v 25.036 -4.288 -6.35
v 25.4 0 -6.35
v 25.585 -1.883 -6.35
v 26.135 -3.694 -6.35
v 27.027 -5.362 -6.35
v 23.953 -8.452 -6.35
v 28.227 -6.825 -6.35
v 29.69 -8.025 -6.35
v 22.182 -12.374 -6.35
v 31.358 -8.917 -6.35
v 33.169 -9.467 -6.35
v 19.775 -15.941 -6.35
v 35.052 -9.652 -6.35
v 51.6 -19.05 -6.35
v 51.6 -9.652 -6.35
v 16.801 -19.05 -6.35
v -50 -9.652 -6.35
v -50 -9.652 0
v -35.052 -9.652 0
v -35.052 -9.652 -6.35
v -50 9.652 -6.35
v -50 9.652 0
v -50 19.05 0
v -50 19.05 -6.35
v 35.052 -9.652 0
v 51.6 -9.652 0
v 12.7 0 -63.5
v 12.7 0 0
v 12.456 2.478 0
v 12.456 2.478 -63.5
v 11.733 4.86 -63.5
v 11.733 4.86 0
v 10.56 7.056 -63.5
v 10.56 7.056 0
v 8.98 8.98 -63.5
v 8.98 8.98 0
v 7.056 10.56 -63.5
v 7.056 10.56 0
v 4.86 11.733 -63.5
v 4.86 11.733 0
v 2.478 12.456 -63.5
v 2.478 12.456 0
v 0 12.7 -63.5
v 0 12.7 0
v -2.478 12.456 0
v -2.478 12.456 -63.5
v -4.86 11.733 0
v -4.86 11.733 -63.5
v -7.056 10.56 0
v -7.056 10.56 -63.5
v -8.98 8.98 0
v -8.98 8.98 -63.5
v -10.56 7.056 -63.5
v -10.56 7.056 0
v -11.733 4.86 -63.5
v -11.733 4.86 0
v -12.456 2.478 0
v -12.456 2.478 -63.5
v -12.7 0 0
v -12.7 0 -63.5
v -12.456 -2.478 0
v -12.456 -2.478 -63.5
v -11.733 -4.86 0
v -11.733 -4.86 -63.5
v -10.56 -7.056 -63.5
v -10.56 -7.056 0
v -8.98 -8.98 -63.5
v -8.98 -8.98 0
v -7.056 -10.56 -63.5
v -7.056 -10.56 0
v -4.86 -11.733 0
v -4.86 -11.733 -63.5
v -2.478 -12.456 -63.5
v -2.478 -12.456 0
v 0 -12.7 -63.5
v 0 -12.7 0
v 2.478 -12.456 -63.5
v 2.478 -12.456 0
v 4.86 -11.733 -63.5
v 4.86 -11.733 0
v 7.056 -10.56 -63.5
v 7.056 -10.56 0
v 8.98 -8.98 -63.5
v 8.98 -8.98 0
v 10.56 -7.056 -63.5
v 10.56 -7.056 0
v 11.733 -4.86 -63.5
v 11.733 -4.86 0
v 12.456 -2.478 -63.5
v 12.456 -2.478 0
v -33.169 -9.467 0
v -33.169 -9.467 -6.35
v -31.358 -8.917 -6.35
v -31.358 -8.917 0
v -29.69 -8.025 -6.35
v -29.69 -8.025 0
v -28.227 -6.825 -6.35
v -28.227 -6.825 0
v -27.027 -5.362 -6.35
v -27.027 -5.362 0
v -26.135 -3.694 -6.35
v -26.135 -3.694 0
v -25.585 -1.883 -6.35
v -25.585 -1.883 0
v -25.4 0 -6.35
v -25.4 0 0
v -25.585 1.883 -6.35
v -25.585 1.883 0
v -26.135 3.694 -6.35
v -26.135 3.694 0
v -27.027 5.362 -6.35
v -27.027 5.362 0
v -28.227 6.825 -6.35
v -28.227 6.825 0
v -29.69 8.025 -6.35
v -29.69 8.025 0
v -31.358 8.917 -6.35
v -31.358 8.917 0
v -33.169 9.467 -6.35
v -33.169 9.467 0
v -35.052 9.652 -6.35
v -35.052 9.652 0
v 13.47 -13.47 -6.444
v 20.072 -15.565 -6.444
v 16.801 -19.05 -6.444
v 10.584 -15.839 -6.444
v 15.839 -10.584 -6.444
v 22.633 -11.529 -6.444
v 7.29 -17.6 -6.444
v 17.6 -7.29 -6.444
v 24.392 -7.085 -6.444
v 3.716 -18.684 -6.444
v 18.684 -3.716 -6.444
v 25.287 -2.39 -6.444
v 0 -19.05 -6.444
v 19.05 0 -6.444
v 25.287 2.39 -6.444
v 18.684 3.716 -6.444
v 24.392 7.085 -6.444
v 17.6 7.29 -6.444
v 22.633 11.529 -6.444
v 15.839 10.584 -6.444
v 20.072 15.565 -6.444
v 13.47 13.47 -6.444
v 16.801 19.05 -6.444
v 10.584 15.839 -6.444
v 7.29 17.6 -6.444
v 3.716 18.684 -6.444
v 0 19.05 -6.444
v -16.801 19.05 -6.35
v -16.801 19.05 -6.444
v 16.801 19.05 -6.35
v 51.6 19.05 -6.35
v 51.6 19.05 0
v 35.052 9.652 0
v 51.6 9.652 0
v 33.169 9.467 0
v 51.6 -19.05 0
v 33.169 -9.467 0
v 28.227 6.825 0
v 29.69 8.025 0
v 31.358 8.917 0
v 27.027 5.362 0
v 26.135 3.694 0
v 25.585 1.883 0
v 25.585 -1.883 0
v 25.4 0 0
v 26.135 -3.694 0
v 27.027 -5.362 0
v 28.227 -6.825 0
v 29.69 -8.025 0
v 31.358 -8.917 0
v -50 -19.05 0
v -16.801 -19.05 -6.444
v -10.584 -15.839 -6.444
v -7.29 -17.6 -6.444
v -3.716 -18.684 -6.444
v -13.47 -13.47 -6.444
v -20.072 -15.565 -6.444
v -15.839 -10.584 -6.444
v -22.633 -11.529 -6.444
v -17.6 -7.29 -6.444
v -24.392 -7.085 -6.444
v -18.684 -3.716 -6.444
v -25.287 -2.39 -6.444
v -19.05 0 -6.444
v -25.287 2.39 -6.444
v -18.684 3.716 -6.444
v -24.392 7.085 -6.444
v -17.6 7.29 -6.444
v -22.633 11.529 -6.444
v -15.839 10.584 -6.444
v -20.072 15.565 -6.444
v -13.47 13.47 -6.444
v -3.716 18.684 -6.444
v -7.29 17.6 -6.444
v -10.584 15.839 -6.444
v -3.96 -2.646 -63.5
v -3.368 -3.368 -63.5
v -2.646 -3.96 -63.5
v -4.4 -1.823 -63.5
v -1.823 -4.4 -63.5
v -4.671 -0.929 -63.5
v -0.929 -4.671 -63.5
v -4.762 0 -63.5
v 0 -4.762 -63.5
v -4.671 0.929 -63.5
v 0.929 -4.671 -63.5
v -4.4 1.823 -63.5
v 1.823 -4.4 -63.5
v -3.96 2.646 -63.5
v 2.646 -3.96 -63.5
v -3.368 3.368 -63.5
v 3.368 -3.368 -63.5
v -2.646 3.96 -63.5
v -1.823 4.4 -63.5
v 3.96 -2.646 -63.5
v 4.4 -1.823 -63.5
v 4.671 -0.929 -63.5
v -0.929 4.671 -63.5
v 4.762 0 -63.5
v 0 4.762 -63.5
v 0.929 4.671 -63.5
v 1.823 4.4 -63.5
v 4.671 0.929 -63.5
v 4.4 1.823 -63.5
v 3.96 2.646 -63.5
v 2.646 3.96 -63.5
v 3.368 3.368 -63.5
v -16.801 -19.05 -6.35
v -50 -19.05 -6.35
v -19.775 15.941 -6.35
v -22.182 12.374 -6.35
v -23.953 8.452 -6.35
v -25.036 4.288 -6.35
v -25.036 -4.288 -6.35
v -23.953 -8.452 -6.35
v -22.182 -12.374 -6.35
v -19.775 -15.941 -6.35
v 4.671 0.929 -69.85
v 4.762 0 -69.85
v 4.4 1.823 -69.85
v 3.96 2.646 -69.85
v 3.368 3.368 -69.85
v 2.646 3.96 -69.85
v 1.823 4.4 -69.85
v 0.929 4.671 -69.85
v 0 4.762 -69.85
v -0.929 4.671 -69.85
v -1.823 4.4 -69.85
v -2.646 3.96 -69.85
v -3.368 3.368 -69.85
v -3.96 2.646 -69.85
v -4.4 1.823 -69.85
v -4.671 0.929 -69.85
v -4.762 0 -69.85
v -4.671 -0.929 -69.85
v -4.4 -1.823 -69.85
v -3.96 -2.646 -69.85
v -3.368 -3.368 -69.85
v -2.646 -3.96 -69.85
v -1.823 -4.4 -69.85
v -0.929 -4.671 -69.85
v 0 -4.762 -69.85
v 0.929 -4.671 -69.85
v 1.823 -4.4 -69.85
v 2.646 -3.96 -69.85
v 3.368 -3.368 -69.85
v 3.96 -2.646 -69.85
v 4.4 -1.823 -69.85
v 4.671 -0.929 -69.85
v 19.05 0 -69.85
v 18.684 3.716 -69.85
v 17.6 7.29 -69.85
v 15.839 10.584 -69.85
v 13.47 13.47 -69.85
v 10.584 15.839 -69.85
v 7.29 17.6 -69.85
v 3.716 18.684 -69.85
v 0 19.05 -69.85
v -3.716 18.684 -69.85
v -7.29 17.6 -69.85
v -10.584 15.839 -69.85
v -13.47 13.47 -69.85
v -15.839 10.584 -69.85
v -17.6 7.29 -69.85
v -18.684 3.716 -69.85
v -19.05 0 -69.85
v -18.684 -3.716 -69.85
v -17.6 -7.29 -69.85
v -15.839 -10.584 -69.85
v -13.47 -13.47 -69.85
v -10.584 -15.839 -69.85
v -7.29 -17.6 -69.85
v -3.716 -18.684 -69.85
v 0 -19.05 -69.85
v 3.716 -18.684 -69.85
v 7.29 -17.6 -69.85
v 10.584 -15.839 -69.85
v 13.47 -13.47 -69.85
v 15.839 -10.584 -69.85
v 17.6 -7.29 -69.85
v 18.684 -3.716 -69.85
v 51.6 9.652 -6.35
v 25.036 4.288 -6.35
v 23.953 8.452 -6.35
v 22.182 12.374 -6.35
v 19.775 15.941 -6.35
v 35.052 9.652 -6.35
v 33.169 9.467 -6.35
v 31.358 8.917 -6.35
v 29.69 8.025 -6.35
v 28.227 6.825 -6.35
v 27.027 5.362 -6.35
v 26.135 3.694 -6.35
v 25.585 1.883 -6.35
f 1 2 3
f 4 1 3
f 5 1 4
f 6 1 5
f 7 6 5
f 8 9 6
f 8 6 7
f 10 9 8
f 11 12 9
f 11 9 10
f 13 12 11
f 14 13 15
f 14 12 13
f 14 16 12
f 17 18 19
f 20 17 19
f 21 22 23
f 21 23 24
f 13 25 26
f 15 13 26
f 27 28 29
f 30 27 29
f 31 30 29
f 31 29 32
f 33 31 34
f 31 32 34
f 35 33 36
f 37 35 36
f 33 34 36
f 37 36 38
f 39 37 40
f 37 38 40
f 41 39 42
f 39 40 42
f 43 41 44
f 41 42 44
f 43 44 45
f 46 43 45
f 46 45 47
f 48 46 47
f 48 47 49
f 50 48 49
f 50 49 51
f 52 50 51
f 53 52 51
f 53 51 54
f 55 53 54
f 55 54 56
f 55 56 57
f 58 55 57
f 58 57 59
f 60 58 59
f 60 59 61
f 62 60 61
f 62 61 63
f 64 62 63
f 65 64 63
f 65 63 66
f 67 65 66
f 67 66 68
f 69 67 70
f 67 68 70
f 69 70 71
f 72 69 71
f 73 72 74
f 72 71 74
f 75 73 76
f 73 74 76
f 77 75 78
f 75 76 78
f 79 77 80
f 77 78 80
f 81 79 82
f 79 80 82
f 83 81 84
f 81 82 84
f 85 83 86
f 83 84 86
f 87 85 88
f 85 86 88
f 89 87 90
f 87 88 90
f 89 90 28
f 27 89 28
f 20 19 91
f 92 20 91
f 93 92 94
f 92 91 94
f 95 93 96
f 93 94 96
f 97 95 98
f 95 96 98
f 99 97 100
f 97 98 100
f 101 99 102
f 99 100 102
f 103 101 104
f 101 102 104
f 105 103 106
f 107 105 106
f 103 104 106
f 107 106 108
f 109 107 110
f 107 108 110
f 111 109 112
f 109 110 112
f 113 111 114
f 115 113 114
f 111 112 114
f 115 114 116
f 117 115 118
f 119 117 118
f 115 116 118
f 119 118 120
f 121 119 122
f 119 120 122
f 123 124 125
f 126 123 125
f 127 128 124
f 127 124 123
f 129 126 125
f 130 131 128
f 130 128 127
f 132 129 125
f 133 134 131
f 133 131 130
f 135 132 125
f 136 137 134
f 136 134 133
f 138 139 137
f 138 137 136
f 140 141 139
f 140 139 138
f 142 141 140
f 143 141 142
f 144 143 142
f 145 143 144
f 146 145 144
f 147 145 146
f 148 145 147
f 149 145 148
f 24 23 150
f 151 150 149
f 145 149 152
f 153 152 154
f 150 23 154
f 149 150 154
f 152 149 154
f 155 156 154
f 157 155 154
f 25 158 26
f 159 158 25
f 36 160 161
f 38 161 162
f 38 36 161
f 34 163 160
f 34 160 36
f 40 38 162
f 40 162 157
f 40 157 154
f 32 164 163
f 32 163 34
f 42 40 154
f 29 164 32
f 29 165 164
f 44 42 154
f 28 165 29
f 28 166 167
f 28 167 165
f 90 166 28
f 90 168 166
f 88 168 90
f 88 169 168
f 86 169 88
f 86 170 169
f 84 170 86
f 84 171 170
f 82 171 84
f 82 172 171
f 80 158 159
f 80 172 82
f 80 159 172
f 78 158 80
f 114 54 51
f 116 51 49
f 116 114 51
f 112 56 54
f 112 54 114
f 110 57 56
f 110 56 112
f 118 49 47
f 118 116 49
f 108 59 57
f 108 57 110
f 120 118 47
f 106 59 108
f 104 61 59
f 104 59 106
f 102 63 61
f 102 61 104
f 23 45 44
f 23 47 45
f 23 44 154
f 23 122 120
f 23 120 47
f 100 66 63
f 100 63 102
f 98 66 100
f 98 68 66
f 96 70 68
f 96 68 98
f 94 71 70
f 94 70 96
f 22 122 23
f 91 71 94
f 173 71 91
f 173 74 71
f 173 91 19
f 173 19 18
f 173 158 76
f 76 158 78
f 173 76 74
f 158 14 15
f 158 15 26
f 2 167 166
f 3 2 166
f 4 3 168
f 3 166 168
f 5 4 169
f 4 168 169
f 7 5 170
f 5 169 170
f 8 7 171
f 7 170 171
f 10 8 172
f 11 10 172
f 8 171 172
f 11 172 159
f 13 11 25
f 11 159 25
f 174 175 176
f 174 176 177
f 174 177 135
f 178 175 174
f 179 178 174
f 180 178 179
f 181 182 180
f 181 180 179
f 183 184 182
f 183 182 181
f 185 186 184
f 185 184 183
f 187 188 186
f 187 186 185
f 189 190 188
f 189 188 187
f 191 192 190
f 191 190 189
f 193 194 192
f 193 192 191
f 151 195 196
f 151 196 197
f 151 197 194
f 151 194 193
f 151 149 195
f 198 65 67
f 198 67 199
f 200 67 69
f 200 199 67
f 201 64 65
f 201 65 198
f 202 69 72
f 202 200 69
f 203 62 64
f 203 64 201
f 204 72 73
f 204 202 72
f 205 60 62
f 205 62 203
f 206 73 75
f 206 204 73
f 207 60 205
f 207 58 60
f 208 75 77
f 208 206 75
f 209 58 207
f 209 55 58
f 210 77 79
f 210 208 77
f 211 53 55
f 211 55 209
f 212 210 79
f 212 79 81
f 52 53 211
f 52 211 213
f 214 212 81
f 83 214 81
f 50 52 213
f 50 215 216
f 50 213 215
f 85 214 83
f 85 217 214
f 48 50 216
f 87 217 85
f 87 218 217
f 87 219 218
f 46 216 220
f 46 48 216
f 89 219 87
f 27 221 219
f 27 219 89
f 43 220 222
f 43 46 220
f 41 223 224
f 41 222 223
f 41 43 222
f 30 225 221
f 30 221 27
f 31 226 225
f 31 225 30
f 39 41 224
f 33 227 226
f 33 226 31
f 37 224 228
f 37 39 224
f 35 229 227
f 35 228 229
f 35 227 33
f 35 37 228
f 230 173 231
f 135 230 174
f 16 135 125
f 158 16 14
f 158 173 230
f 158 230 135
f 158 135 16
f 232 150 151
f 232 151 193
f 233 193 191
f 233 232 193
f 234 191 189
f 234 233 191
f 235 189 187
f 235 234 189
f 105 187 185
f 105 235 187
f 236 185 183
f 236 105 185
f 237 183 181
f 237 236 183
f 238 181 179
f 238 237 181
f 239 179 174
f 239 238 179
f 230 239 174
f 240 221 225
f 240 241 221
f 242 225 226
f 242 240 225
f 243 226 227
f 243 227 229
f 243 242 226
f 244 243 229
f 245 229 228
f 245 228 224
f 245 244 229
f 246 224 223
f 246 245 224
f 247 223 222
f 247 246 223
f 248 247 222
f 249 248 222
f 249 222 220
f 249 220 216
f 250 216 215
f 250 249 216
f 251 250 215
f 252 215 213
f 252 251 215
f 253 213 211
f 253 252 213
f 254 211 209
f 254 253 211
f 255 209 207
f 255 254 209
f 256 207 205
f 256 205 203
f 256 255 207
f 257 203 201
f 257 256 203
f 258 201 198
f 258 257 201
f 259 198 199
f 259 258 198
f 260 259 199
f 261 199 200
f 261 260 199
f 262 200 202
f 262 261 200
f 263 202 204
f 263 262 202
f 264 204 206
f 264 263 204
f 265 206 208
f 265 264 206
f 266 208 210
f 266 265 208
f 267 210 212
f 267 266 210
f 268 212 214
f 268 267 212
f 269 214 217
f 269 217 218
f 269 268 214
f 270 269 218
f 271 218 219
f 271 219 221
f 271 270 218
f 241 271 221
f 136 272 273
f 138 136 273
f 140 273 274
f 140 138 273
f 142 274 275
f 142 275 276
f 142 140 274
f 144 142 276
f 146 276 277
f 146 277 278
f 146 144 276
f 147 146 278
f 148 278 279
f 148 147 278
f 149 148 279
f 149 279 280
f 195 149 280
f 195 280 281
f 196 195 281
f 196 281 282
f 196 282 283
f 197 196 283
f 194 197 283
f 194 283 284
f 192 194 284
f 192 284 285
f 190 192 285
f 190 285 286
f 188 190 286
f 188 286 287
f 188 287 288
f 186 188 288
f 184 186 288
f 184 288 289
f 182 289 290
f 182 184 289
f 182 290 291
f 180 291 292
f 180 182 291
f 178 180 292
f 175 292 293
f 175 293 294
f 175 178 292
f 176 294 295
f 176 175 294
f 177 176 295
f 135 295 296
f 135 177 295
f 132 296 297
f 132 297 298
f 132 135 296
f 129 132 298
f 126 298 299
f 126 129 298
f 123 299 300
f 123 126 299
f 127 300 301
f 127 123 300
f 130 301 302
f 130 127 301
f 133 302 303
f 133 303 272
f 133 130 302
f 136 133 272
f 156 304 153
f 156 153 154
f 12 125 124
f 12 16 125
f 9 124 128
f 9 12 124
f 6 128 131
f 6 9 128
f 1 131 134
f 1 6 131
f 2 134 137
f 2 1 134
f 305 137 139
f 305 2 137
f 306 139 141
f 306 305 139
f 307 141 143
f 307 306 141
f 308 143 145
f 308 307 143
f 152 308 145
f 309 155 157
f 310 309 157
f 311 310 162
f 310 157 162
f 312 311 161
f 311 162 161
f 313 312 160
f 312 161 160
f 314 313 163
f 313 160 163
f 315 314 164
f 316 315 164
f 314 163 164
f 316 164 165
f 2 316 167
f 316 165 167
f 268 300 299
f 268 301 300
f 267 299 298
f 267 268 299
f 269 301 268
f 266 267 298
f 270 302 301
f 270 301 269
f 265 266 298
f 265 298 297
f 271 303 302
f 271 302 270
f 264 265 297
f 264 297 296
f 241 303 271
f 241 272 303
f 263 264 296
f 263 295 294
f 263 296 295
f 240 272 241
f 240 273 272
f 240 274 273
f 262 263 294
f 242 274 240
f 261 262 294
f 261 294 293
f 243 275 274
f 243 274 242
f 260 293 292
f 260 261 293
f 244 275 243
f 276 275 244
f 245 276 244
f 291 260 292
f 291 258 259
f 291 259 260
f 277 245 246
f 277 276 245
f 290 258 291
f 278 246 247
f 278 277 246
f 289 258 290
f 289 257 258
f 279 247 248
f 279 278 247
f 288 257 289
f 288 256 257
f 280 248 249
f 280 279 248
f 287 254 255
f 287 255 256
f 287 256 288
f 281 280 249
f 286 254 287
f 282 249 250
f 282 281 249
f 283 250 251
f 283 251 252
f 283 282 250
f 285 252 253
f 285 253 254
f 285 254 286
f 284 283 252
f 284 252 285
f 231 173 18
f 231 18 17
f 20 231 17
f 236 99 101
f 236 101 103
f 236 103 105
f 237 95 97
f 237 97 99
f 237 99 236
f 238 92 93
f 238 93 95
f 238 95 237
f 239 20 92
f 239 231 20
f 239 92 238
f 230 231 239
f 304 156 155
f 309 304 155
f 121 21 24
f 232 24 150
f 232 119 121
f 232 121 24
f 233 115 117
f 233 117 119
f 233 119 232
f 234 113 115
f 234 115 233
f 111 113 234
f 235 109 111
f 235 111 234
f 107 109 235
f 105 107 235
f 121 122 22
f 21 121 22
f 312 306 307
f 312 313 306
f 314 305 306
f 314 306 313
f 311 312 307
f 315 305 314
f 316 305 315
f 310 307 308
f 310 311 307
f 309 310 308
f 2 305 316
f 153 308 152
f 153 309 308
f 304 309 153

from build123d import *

# Parameters (mm, degrees)
F3_DEPTH      = 19.05
F3_DEPTH_BACK = 19.05
F4_R          = 12.7
F5_DEPTH      = 25.4
F8_DEPTH      = 69.851
F9_DEPTH      = 25.4


with BuildPart() as f1:
    # F0 (on Front) → F1 (revolve)
    with BuildSketch(Plane.XZ):
        Polygon((25.4, 0), (12.7, 0), (12.7, -63.5), (4.7625, -63.5), (4.7625, -69.85), (19.05, -69.85), (19.05, -6.444424), (25.4, -6.444424), align=None)
    revolve(axis=Axis((0, 0, -15.169185), (0, 0, 1)))


with BuildPart() as f3:
    # F2 (on Front) → F3 (new body, two sides)
    with BuildSketch(Plane.XZ) as f3_sk:
        Polygon((51.600001, 0), (0, 0), (-49.999999, 0), (-49.999999, -6.35), (0, -6.35), (51.600001, -6.35), align=None)
    extrude(amount=F3_DEPTH)
    extrude(f3_sk.sketch, amount=-F3_DEPTH_BACK)

    # F4 (on Top) → F5 (cut)
    with BuildSketch(Plane.XY):
        Circle(F4_R)
    extrude(amount=-F5_DEPTH, mode=Mode.SUBTRACT)

    # F6: union F1
    add(f1.part)

    # F7 (on Top) → F8 (cut, through all)
    with BuildSketch(Plane.XY):
        Polygon((0, -19.05), (-16.800521, -19.05), (-16.800521, -29.420776), (16.800521, -29.420776), (16.800521, -19.05), align=None)
        Polygon((-16.800521, 19.05), (0, 19.05), (16.800521, 19.05), (16.800521, 27.208871), (-16.800521, 27.208871), align=None)
    extrude(amount=-F8_DEPTH, mode=Mode.SUBTRACT)

    # F7 (on Top) → F9 (cut)
    with BuildSketch(Plane.XY):
        with BuildLine():
            Line((51.600001, -9.652), (51.600001, 9.652))
            Line((51.600001, 9.652), (35.052, 9.652))
            ThreePointArc((35.052, 9.652), (28.227005, 6.824995), (25.4, 0))
            ThreePointArc((25.4, 0), (28.227005, -6.824995), (35.052, -9.652))
            Line((35.052, -9.652), (51.600001, -9.652))
        make_face()
        with BuildLine():
            Line((-35.052, 9.652), (-49.999999, 9.652))
            Line((-49.999999, 9.652), (-49.999999, -9.652))
            Line((-49.999999, -9.652), (-35.052, -9.652))
            ThreePointArc((-35.052, -9.652), (-25.4, 0), (-35.052, 9.652))
        make_face()
    extrude(amount=-F9_DEPTH, mode=Mode.SUBTRACT)


solid = f3.part
